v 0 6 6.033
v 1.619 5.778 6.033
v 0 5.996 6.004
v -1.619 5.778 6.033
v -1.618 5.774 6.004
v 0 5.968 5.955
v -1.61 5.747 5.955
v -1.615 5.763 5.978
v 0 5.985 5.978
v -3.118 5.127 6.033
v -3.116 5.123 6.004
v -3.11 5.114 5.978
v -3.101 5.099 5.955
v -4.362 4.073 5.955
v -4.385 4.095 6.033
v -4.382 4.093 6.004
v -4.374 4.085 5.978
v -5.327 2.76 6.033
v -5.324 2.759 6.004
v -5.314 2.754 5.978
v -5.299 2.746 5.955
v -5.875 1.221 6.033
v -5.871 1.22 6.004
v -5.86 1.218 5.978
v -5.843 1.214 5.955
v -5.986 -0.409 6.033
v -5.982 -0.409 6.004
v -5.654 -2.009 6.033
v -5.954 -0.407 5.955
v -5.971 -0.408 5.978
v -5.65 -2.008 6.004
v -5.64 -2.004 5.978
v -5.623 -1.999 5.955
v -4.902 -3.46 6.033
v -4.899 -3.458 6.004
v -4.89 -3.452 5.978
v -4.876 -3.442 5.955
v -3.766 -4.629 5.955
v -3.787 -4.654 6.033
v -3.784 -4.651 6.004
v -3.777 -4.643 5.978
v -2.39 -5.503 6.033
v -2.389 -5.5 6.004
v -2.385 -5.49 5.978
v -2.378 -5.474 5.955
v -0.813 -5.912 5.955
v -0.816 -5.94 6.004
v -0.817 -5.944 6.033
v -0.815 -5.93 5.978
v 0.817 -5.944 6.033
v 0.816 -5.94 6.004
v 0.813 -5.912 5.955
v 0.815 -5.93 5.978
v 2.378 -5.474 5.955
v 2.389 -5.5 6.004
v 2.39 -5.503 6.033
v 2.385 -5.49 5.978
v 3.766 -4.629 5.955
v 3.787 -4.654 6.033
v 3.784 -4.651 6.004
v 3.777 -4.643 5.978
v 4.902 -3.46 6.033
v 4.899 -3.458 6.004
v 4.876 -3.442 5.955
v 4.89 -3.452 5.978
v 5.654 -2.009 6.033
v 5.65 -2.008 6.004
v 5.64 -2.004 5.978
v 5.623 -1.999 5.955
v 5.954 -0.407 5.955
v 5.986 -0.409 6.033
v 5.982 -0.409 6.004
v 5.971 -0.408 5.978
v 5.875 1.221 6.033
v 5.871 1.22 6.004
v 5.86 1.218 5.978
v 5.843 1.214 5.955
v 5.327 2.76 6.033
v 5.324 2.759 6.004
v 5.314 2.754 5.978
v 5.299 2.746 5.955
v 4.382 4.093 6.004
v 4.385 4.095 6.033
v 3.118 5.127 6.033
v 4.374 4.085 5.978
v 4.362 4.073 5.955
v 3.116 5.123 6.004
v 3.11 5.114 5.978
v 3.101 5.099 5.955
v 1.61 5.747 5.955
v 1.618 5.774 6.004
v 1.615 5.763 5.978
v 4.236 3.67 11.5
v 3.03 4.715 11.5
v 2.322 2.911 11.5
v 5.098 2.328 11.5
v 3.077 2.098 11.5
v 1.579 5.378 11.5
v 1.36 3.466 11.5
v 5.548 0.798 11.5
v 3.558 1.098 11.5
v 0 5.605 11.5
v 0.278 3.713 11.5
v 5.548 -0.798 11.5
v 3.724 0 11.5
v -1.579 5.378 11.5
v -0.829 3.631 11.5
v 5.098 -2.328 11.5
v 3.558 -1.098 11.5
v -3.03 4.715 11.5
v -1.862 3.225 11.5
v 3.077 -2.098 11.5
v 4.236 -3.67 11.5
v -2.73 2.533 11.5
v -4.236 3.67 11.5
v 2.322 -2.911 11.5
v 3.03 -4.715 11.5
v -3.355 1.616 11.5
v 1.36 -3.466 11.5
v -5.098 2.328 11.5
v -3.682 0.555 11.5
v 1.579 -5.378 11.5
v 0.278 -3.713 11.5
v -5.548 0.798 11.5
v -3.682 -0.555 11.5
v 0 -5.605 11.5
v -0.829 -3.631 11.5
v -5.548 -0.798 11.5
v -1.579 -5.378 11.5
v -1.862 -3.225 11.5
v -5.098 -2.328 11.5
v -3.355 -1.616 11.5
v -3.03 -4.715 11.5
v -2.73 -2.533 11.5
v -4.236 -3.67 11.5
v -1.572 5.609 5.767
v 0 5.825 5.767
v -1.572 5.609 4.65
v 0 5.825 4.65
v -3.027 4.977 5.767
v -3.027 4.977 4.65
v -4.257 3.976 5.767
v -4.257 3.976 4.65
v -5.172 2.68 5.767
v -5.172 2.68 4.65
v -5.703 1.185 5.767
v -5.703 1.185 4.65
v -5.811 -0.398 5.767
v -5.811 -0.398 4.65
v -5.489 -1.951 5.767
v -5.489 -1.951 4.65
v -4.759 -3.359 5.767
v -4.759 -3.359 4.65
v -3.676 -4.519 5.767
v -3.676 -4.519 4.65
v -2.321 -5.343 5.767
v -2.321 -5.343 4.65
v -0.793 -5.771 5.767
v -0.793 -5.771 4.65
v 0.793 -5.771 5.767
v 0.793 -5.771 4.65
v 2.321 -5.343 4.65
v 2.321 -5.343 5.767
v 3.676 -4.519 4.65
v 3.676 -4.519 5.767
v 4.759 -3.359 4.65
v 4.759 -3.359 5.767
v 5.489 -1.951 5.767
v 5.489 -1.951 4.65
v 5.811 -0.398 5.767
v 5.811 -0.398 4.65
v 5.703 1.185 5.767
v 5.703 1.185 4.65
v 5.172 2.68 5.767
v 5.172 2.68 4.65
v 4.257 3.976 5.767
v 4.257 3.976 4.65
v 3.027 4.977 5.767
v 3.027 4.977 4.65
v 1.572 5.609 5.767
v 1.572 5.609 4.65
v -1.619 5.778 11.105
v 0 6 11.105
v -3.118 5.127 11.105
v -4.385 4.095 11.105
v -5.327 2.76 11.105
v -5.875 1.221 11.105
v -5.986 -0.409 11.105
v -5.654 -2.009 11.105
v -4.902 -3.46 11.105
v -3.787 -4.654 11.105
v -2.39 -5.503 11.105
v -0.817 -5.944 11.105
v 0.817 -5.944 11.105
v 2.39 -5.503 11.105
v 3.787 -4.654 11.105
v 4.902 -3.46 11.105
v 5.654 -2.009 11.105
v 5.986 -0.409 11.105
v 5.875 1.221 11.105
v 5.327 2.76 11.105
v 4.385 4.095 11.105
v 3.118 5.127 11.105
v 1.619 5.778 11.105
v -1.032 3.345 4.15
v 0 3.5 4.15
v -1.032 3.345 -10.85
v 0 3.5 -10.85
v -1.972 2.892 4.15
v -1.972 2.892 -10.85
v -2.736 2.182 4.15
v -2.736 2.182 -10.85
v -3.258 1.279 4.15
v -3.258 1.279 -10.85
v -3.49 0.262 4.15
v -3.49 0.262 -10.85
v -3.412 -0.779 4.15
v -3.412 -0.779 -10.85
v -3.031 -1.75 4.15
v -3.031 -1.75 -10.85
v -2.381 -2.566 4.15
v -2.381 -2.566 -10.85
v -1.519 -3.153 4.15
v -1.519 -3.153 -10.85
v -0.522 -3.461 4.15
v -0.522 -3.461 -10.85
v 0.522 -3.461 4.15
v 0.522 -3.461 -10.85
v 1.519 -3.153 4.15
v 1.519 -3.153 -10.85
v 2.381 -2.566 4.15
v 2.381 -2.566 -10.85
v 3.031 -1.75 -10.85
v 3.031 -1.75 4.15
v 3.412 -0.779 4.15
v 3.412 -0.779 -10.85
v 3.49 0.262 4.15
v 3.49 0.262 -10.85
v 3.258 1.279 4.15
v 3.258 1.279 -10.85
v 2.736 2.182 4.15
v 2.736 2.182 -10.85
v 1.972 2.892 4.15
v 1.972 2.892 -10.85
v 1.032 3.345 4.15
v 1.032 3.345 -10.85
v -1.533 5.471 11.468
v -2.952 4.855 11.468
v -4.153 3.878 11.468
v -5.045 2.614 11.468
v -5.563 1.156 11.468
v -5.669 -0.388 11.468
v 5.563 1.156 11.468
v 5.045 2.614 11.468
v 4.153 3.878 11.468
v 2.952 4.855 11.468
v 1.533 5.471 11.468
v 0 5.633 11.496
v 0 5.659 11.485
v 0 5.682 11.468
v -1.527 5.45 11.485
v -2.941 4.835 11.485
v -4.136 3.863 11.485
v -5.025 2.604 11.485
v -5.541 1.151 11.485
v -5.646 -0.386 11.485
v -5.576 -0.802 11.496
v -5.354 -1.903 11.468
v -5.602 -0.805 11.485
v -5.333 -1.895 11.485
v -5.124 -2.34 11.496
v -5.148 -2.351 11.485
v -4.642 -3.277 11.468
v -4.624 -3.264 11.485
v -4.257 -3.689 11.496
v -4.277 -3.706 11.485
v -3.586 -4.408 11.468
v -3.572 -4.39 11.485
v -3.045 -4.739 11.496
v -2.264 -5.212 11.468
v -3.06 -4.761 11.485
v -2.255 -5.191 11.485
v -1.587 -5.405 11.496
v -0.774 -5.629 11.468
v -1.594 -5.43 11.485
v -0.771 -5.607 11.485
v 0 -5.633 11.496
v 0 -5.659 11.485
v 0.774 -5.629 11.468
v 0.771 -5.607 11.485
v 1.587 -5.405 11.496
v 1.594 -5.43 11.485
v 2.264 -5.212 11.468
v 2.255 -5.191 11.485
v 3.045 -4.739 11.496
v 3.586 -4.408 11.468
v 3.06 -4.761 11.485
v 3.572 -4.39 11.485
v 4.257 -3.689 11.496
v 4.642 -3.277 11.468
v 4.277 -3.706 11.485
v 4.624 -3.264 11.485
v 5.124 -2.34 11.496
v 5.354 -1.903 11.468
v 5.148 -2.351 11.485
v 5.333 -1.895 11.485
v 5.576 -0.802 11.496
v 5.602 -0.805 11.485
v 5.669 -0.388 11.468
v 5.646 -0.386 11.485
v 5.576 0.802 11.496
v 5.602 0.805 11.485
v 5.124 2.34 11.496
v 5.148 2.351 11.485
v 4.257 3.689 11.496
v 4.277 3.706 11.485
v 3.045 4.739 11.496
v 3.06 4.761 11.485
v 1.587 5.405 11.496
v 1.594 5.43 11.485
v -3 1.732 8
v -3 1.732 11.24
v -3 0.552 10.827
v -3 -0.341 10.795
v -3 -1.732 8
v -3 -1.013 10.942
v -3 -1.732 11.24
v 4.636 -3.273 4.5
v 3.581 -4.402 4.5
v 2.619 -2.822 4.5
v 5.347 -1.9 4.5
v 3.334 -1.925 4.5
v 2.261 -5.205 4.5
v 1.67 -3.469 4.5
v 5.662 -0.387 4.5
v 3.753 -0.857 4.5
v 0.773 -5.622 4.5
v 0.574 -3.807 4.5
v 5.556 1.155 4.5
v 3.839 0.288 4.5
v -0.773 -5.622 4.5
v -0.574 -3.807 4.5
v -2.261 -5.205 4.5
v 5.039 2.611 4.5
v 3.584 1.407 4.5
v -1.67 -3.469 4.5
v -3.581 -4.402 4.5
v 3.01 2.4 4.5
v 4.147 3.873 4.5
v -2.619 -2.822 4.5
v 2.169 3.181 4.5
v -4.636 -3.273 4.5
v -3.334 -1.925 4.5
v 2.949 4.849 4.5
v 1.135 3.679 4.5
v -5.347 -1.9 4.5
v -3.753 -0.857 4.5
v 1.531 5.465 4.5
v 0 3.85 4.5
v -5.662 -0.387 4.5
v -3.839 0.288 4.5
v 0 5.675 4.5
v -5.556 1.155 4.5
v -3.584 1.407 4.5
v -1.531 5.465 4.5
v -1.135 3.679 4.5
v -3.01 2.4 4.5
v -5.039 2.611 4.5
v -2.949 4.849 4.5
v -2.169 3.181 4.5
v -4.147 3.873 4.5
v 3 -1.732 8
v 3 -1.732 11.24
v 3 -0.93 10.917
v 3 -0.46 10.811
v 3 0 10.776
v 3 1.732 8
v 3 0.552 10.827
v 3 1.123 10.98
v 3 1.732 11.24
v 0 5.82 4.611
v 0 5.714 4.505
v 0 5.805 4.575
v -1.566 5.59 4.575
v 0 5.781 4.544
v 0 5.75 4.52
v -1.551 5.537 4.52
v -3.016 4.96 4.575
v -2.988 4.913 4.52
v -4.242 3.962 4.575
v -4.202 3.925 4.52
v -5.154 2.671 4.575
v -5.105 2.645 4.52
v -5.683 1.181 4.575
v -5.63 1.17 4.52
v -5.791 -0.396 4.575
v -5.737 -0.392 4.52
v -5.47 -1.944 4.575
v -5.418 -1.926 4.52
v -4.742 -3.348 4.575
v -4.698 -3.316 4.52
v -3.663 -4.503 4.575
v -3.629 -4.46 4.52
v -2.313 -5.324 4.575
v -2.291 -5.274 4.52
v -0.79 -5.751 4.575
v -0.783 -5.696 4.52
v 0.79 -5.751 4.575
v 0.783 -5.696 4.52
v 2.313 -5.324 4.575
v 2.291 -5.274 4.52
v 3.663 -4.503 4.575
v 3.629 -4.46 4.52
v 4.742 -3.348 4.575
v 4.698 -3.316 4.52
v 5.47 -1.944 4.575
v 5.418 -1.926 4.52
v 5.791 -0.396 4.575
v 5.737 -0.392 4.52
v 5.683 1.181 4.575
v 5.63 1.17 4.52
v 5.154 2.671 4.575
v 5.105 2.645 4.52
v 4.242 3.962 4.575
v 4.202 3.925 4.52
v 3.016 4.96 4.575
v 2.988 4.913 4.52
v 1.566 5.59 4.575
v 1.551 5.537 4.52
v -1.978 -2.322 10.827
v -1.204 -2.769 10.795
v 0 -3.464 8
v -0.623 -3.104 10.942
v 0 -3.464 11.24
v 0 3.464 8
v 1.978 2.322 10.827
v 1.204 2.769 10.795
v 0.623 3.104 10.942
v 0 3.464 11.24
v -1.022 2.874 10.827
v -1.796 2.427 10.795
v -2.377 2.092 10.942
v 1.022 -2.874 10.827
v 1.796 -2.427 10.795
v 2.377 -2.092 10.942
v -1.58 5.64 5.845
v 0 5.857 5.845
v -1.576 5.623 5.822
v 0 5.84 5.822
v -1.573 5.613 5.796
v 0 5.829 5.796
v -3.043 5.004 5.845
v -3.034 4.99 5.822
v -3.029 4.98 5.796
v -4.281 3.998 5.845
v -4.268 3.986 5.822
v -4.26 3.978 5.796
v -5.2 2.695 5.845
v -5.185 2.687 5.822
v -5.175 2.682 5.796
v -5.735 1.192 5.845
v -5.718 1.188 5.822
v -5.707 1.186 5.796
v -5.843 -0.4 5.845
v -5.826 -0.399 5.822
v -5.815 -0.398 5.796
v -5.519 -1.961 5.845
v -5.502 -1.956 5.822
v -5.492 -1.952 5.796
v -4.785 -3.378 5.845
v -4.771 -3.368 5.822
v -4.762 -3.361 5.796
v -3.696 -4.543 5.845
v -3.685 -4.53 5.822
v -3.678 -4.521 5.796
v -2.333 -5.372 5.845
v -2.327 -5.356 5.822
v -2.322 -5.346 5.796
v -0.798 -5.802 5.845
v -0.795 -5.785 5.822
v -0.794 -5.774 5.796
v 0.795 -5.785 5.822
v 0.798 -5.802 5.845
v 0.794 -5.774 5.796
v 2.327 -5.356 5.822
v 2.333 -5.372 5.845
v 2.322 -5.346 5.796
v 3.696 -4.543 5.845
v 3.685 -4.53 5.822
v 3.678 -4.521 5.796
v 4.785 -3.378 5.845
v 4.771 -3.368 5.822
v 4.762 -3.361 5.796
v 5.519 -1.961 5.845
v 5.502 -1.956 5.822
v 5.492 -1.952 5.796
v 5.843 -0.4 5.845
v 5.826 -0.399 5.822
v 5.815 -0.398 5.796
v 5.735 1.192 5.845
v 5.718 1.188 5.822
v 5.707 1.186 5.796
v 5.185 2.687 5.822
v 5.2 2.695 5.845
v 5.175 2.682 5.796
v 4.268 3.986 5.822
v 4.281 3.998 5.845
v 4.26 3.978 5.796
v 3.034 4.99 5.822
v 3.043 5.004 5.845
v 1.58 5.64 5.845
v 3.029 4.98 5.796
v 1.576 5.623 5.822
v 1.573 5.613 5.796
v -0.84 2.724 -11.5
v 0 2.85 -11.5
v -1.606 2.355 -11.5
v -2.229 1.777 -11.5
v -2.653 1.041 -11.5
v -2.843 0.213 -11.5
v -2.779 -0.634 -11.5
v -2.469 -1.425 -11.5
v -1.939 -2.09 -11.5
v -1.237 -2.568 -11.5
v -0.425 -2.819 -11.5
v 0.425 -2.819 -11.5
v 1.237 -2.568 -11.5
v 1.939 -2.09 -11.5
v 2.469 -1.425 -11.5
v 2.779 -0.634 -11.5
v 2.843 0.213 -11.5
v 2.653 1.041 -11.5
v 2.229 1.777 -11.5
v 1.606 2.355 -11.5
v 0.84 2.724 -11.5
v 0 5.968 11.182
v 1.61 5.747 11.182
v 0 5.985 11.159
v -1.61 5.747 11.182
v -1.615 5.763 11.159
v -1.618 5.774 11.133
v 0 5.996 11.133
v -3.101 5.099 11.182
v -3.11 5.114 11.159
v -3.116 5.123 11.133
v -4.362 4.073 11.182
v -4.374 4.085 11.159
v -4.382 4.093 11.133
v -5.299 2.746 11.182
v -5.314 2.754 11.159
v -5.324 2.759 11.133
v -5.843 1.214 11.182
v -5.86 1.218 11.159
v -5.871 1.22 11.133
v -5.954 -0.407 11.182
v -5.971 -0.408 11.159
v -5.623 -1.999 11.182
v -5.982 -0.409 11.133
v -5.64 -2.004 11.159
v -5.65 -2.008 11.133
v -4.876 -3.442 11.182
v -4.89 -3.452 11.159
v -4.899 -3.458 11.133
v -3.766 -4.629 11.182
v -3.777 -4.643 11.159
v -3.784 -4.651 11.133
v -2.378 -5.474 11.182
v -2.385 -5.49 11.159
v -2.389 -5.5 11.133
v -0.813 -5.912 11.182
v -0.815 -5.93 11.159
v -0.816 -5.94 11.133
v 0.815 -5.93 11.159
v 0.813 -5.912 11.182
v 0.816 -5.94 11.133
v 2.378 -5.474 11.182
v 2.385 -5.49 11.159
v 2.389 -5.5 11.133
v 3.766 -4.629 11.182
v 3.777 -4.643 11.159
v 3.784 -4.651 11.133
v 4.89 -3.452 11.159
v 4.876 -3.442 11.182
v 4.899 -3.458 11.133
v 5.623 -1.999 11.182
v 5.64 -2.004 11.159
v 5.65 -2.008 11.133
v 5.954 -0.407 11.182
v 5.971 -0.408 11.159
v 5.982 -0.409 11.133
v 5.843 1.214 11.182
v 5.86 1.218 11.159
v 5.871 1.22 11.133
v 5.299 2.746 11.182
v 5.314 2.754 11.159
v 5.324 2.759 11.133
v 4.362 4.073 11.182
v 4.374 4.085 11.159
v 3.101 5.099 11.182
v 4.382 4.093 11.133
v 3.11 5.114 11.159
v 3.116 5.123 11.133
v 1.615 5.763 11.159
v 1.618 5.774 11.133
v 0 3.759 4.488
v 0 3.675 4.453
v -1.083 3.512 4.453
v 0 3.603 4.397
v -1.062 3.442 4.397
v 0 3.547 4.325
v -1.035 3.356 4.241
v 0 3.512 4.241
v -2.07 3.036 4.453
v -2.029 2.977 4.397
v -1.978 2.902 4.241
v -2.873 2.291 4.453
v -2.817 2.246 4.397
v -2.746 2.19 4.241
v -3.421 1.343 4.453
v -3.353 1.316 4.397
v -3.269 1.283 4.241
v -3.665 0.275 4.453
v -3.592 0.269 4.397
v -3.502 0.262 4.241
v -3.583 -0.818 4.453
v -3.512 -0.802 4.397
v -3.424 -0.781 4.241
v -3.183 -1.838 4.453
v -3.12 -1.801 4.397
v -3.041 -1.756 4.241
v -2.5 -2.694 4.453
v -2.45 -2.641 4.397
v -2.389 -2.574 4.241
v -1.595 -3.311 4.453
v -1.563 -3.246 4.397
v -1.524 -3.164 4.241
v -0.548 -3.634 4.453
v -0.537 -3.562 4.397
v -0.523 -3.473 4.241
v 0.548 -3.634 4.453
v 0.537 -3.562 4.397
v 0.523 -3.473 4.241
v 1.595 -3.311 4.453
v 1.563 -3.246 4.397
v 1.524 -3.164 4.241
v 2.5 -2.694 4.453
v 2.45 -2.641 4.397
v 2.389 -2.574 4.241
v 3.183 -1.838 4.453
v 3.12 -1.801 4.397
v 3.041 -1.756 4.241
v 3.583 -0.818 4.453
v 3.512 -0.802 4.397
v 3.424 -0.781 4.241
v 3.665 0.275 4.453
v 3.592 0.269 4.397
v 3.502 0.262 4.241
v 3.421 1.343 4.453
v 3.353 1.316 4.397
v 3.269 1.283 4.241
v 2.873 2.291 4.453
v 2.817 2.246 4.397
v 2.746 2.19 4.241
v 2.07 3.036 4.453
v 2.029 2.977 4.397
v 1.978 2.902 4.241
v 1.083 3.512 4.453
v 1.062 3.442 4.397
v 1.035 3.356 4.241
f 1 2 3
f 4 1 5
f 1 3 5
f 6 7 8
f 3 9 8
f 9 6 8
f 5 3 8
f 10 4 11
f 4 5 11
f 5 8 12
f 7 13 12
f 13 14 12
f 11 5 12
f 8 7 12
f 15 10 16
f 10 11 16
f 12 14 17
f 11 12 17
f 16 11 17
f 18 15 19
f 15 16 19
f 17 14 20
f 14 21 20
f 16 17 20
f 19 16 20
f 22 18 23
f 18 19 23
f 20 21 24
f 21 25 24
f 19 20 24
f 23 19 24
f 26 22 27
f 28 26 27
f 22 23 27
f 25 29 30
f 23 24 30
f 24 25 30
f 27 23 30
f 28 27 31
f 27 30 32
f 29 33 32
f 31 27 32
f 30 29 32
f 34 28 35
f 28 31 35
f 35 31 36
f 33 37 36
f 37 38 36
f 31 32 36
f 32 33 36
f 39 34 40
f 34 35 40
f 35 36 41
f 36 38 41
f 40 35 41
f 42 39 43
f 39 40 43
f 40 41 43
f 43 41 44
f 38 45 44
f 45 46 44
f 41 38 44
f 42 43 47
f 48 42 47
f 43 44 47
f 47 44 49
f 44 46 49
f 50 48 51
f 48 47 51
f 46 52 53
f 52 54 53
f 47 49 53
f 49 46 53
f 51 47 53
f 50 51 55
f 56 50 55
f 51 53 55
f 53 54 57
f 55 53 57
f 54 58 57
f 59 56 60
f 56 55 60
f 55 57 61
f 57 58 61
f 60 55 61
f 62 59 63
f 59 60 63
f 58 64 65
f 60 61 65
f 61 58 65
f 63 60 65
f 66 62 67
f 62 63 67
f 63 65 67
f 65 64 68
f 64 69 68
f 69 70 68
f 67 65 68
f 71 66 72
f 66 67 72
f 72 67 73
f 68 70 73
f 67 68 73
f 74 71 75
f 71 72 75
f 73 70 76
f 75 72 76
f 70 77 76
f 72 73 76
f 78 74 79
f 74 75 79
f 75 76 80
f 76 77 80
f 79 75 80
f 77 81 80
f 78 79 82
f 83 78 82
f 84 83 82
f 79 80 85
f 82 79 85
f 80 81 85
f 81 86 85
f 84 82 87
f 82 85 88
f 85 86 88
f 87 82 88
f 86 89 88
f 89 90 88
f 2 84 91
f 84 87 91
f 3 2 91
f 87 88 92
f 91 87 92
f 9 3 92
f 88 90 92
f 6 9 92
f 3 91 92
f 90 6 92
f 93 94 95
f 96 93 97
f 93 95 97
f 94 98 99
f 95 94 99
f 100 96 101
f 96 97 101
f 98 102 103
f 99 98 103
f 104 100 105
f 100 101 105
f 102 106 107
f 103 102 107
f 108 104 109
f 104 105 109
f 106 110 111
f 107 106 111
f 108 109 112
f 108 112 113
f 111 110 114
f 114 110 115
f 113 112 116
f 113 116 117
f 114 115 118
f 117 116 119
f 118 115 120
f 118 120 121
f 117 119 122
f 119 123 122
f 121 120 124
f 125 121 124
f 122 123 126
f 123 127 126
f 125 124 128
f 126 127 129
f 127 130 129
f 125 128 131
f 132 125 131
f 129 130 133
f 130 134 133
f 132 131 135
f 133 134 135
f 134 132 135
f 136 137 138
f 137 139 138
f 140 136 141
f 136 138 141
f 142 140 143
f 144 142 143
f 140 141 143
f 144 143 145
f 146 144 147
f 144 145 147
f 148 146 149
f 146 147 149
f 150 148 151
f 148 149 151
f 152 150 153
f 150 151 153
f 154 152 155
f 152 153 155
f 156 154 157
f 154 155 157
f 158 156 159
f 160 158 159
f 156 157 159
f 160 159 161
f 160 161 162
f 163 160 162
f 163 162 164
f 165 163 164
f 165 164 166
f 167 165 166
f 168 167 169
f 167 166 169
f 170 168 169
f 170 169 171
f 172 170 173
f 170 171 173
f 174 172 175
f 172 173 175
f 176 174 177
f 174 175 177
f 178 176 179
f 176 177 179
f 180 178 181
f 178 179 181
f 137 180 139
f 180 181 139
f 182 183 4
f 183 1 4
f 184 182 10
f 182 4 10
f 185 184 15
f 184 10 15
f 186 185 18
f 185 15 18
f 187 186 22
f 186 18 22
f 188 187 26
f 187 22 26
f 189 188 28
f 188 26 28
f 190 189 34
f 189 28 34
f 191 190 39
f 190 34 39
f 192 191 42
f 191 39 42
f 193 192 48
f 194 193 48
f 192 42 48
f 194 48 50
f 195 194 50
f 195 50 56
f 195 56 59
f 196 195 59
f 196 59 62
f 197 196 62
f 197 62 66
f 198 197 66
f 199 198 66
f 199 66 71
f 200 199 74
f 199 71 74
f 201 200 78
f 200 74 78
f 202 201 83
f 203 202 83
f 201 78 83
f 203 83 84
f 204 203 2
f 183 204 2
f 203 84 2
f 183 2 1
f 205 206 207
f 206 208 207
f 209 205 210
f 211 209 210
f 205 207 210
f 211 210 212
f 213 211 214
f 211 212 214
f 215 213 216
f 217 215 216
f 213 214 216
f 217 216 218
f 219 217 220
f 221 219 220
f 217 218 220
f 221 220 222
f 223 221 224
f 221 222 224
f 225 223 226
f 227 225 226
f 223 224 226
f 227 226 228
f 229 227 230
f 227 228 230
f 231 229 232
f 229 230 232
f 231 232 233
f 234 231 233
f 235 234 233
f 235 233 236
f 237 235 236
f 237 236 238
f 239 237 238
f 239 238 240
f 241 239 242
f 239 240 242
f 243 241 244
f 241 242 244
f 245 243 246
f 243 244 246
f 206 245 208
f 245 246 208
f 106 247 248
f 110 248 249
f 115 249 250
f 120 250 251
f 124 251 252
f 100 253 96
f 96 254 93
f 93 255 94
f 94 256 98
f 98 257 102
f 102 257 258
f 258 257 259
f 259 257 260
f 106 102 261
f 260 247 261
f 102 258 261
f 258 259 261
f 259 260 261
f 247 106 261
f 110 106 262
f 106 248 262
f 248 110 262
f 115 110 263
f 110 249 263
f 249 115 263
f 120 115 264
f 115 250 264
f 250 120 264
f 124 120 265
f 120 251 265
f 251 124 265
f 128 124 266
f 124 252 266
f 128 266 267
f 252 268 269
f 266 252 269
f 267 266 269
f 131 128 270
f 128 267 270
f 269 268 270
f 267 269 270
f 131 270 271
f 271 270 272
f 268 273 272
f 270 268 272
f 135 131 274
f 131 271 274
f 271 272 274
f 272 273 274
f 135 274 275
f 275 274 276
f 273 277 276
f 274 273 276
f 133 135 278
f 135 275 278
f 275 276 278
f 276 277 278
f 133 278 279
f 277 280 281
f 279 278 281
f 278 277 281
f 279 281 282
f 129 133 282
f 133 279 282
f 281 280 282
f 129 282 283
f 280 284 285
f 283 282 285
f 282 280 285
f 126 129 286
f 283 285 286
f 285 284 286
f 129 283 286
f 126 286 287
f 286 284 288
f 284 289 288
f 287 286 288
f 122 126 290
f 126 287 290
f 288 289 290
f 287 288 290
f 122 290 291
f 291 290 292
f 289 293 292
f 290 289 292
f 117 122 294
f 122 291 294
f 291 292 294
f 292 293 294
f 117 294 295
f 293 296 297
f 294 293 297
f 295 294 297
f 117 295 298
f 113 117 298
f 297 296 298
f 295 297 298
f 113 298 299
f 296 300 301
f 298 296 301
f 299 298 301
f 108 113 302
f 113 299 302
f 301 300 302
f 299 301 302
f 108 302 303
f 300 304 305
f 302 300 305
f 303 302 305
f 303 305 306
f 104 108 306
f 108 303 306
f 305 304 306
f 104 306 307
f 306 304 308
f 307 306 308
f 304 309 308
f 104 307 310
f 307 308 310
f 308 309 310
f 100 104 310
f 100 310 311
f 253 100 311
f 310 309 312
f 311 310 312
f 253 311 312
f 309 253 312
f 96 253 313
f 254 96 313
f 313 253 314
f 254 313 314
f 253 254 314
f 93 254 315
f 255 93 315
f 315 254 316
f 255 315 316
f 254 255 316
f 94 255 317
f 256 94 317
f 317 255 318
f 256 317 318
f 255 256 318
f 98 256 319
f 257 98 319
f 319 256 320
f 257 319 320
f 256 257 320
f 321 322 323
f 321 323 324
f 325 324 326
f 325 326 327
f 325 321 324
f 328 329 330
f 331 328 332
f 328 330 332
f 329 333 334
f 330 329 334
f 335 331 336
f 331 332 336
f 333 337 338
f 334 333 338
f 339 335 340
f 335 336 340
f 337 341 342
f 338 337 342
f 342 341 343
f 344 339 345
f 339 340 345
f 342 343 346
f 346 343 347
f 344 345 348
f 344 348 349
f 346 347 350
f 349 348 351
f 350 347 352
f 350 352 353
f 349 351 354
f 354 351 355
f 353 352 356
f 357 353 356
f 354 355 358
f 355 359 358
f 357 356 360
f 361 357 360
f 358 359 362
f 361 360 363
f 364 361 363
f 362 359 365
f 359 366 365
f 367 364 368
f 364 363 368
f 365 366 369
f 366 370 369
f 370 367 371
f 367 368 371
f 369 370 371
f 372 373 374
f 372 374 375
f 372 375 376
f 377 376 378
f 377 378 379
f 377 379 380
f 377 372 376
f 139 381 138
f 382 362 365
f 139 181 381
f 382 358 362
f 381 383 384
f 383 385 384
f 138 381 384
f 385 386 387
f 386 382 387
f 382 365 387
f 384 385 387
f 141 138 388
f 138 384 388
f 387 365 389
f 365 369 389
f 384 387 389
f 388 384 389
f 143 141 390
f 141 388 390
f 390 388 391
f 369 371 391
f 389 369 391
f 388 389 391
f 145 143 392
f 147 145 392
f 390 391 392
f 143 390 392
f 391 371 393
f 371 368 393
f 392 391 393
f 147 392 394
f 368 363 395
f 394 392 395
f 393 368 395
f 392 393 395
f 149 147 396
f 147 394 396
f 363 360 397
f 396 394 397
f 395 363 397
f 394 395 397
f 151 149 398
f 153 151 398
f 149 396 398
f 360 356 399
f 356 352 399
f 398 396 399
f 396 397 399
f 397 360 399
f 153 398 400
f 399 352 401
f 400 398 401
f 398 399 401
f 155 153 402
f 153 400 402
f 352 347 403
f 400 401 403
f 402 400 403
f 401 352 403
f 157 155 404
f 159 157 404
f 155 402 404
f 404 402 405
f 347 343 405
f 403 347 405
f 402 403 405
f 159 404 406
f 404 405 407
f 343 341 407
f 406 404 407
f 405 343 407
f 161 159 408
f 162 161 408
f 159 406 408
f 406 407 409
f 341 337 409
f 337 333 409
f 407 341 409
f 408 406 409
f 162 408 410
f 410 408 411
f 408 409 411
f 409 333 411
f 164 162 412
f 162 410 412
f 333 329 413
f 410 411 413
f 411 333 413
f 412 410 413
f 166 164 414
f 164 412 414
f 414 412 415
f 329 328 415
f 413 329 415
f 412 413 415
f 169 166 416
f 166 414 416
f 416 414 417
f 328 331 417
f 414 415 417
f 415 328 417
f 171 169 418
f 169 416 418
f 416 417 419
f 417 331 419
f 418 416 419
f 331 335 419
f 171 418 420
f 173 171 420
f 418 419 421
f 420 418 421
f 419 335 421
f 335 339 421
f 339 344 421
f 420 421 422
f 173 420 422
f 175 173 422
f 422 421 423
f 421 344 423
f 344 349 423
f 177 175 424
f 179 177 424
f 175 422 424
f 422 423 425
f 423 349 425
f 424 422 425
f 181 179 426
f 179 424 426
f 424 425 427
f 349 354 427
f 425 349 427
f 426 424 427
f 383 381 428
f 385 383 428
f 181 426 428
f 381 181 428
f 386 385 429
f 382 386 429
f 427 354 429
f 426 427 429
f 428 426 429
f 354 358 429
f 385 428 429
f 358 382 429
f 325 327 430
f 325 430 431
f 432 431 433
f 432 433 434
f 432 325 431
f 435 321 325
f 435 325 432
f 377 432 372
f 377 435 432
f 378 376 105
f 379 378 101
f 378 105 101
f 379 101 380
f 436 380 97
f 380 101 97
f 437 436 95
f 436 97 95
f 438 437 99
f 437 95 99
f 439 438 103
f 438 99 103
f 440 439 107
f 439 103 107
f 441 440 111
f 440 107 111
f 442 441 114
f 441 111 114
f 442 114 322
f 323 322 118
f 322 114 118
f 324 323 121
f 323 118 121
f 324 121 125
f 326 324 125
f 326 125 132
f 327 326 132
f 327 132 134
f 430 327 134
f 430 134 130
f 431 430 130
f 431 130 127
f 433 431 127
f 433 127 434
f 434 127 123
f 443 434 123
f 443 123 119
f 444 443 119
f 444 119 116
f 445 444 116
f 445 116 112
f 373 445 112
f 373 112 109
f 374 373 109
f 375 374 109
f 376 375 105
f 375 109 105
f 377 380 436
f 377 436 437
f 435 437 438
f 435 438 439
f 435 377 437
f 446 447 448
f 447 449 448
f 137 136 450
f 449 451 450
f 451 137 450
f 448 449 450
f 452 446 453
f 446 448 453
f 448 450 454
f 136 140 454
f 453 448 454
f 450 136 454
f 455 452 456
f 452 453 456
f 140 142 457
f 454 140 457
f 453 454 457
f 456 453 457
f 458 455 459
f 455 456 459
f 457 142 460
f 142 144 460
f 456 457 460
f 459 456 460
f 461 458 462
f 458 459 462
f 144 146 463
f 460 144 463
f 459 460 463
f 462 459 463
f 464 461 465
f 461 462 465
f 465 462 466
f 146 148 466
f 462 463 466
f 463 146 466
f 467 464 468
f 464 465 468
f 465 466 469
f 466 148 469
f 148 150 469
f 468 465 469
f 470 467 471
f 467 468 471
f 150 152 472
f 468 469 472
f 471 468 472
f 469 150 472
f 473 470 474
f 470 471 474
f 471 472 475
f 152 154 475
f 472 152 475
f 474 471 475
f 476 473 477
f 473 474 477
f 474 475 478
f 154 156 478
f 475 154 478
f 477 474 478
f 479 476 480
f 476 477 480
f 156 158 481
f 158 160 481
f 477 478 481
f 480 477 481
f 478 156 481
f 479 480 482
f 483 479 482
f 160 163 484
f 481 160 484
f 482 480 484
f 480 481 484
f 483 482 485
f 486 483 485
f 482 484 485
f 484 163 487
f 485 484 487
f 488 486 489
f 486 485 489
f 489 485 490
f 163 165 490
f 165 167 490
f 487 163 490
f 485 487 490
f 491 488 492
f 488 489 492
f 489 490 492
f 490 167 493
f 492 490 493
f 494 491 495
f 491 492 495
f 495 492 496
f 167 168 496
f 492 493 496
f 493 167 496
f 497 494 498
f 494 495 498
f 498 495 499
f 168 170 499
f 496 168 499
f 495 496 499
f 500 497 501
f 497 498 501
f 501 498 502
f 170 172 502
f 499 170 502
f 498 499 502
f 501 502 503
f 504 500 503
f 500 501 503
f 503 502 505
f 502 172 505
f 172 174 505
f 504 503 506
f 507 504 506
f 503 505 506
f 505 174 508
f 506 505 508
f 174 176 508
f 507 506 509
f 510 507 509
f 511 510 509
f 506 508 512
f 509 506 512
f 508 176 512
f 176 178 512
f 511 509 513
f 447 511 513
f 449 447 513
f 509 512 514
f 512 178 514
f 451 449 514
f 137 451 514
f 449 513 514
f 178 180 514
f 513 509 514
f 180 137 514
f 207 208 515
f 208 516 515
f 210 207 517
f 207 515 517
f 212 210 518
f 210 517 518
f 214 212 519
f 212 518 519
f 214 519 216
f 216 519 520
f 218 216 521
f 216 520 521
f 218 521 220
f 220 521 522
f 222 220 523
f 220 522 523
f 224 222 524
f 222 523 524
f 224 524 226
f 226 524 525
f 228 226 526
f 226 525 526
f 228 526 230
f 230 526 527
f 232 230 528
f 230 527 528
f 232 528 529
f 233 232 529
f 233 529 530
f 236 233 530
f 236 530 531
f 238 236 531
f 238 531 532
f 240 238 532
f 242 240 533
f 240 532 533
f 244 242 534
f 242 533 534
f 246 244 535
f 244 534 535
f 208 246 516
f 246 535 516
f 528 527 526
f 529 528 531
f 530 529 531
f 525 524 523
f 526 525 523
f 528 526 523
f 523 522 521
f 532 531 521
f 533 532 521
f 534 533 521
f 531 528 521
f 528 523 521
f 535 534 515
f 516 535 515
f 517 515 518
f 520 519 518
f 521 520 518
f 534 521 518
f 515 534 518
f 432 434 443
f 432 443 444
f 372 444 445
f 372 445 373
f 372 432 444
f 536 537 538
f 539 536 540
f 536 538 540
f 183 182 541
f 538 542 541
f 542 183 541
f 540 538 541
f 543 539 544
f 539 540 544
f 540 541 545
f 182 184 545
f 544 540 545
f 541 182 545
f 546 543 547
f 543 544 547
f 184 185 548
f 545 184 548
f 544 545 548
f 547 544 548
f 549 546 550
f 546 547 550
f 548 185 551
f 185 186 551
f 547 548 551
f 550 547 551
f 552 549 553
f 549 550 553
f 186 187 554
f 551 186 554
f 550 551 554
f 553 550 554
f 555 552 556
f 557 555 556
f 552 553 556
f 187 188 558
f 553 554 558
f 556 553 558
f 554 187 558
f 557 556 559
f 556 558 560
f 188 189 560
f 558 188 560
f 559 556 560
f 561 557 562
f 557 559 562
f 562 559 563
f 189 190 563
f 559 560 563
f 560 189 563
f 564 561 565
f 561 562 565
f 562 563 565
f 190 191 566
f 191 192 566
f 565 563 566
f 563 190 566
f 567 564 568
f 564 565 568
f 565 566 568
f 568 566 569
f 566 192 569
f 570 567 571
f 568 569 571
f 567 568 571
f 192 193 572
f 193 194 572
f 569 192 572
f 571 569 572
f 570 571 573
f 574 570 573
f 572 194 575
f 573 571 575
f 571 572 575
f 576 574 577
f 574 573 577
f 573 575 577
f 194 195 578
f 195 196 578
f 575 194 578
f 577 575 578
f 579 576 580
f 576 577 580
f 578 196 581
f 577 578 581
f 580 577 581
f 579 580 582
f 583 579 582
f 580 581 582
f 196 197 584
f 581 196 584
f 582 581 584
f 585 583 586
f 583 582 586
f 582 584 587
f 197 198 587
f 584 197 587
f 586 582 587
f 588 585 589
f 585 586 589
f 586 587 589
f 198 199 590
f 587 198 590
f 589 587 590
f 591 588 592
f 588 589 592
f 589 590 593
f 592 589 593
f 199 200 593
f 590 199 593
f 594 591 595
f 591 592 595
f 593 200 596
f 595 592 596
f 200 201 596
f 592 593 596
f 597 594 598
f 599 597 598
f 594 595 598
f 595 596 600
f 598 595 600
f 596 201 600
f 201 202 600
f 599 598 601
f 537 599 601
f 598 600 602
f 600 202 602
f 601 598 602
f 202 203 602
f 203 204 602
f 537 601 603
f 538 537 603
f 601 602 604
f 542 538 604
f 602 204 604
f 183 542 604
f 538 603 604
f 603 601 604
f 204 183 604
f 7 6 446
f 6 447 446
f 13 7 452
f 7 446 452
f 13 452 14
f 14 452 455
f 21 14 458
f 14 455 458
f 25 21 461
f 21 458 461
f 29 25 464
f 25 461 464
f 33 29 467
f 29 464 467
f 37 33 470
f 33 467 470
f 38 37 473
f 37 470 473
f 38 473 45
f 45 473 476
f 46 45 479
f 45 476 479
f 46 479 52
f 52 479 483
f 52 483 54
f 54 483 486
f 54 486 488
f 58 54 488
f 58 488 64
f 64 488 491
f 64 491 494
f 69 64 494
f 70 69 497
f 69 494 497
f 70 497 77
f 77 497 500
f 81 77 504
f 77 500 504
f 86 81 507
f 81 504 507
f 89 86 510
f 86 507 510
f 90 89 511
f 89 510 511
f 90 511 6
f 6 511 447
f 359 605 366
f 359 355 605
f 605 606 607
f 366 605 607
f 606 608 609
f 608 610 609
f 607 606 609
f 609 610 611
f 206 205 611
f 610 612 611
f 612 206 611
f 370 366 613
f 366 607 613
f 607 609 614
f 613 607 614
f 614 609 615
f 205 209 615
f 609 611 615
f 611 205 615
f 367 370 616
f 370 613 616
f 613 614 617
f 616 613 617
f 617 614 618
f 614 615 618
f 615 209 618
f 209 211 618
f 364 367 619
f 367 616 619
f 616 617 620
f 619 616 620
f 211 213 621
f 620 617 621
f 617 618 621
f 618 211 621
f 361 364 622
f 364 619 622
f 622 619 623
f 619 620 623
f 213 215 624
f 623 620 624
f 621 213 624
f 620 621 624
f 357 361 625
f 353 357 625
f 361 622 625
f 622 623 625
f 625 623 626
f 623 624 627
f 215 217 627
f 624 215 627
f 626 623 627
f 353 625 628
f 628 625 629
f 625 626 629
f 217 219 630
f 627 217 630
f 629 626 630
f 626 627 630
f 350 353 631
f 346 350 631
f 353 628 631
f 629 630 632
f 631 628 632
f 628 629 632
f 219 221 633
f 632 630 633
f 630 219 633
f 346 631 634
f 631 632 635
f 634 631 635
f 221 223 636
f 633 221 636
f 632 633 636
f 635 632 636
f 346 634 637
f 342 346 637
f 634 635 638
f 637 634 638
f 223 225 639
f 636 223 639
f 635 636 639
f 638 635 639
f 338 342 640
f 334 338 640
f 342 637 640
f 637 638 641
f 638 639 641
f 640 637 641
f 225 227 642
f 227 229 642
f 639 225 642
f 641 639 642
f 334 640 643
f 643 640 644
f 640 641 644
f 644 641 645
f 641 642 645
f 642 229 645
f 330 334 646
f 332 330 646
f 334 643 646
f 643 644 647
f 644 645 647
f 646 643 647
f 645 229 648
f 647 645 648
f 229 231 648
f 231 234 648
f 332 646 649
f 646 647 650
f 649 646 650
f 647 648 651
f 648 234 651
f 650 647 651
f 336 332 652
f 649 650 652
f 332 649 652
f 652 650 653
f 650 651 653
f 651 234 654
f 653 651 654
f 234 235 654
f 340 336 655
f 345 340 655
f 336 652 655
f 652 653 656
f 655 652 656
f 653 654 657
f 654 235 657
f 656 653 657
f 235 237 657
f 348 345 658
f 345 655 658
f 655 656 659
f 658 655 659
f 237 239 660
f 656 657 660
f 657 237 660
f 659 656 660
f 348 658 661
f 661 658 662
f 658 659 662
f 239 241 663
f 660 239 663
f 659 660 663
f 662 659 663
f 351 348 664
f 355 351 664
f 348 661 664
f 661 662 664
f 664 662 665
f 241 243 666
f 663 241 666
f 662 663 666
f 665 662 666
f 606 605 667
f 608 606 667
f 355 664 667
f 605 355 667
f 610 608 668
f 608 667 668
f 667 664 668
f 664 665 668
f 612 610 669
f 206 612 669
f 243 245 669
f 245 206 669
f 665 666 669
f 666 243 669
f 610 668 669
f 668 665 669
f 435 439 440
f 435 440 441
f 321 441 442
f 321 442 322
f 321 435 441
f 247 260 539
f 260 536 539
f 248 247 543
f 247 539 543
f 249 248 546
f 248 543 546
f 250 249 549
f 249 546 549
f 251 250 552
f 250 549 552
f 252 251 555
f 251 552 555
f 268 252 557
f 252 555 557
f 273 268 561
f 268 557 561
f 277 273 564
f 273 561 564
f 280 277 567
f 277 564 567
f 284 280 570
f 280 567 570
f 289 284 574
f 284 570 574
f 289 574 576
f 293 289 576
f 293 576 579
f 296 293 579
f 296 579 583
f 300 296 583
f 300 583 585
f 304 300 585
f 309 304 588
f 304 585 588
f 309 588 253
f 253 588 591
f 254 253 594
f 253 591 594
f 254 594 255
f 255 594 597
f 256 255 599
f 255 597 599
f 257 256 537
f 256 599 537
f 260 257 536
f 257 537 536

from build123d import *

# Parameters (mm, degrees)
CUT_EXTRUDE1_START = -3.5
CUT_EXTRUDE1_DEPTH = 3.5
SKETCH4_R          = 3.723909236
CUT_EXTRUDE2_DEPTH = 3.5
CUT_EXTRUDE2_DRAFT = -45


with BuildPart() as part:
    # Sketch2 → Revolve1 (revolve)
    with BuildSketch(Plane(origin=(0, 0, 0), x_dir=(0, 0, -1), z_dir=(1, 0, 0))):
        with BuildLine():
            Line((-11.5, 0), (-11.5, 5.604695392))
            ThreePointArc((-11.5, 5.604695392), (-11.491674324, 5.646551392), (-11.467964804, 5.682035196))
            Line((-11.467964804, 5.682035196), (-11.182035196, 5.967964804))
            ThreePointArc((-11.182035196, 5.967964804), (-11.146551392, 5.991674324), (-11.104695392, 6))
            Line((-11.104695392, 6), (-6.032804608, 6))
            ThreePointArc((-6.032804608, 6), (-5.990948608, 5.991674324), (-5.955464804, 5.967964804))
            Line((-5.955464804, 5.967964804), (-5.844535196, 5.857035196))
            ThreePointArc((-5.844535196, 5.857035196), (-5.809051392, 5.833325676), (-5.767195392, 5.825))
            Line((-5.767195392, 5.825), (-4.65, 5.825))
            ThreePointArc((-4.65, 5.825), (-4.543933983, 5.781066017), (-4.5, 5.675))
            Line((-4.5, 5.675), (-4.5, 3.85))
            ThreePointArc((-4.5, 3.85), (-4.397487373, 3.602512627), (-4.15, 3.5))
            Line((-4.15, 3.5), (10.850480947, 3.5))
            Line((10.850480947, 3.5), (11.5, 2.850480947))
            Line((11.5, 2.850480947), (11.5, 0))
            Line((11.5, 0), (-11.5, 0))
        make_face()
    revolve(axis=Axis((0, 0, -11.5), (0, 0, 1)))

    # Sketch3 → Cut-Extrude1 (cut)
    with BuildSketch(Plane.XY.offset(11.5).offset(CUT_EXTRUDE1_START)):
        Polygon((3, -1.732050808), (3, 1.732050808), (0, 3.464101615), (-3, 1.732050808), (-3, -1.732050808), (0, -3.464101615), align=None)
    extrude(amount=CUT_EXTRUDE1_DEPTH, mode=Mode.SUBTRACT)


with BuildPart() as cut_extrude2_tool:
    # Sketch4 → Cut-Extrude2 (with draft: the straight prism first)
    with BuildSketch(Plane.XY.offset(11.5)):
        Circle(SKETCH4_R)
    extrude(amount=-CUT_EXTRUDE2_DEPTH)
    # Cut-Extrude2: the draft: its side faces are tilted about the plane it starts from
    cut_extrude2_sides = [cut_extrude2_tool.faces().sort_by_distance(p)[0] for p in [
        (-3.723909236, 0, 9.75),
    ]]
    draft(cut_extrude2_sides, Plane.XY.offset(11.5), CUT_EXTRUDE2_DRAFT)


with BuildPart() as part_1:
    add(part.part)

    # Cut-Extrude2: cut by cut_extrude2_tool
    add(cut_extrude2_tool.part, mode=Mode.SUBTRACT)


solid = part_1.part
